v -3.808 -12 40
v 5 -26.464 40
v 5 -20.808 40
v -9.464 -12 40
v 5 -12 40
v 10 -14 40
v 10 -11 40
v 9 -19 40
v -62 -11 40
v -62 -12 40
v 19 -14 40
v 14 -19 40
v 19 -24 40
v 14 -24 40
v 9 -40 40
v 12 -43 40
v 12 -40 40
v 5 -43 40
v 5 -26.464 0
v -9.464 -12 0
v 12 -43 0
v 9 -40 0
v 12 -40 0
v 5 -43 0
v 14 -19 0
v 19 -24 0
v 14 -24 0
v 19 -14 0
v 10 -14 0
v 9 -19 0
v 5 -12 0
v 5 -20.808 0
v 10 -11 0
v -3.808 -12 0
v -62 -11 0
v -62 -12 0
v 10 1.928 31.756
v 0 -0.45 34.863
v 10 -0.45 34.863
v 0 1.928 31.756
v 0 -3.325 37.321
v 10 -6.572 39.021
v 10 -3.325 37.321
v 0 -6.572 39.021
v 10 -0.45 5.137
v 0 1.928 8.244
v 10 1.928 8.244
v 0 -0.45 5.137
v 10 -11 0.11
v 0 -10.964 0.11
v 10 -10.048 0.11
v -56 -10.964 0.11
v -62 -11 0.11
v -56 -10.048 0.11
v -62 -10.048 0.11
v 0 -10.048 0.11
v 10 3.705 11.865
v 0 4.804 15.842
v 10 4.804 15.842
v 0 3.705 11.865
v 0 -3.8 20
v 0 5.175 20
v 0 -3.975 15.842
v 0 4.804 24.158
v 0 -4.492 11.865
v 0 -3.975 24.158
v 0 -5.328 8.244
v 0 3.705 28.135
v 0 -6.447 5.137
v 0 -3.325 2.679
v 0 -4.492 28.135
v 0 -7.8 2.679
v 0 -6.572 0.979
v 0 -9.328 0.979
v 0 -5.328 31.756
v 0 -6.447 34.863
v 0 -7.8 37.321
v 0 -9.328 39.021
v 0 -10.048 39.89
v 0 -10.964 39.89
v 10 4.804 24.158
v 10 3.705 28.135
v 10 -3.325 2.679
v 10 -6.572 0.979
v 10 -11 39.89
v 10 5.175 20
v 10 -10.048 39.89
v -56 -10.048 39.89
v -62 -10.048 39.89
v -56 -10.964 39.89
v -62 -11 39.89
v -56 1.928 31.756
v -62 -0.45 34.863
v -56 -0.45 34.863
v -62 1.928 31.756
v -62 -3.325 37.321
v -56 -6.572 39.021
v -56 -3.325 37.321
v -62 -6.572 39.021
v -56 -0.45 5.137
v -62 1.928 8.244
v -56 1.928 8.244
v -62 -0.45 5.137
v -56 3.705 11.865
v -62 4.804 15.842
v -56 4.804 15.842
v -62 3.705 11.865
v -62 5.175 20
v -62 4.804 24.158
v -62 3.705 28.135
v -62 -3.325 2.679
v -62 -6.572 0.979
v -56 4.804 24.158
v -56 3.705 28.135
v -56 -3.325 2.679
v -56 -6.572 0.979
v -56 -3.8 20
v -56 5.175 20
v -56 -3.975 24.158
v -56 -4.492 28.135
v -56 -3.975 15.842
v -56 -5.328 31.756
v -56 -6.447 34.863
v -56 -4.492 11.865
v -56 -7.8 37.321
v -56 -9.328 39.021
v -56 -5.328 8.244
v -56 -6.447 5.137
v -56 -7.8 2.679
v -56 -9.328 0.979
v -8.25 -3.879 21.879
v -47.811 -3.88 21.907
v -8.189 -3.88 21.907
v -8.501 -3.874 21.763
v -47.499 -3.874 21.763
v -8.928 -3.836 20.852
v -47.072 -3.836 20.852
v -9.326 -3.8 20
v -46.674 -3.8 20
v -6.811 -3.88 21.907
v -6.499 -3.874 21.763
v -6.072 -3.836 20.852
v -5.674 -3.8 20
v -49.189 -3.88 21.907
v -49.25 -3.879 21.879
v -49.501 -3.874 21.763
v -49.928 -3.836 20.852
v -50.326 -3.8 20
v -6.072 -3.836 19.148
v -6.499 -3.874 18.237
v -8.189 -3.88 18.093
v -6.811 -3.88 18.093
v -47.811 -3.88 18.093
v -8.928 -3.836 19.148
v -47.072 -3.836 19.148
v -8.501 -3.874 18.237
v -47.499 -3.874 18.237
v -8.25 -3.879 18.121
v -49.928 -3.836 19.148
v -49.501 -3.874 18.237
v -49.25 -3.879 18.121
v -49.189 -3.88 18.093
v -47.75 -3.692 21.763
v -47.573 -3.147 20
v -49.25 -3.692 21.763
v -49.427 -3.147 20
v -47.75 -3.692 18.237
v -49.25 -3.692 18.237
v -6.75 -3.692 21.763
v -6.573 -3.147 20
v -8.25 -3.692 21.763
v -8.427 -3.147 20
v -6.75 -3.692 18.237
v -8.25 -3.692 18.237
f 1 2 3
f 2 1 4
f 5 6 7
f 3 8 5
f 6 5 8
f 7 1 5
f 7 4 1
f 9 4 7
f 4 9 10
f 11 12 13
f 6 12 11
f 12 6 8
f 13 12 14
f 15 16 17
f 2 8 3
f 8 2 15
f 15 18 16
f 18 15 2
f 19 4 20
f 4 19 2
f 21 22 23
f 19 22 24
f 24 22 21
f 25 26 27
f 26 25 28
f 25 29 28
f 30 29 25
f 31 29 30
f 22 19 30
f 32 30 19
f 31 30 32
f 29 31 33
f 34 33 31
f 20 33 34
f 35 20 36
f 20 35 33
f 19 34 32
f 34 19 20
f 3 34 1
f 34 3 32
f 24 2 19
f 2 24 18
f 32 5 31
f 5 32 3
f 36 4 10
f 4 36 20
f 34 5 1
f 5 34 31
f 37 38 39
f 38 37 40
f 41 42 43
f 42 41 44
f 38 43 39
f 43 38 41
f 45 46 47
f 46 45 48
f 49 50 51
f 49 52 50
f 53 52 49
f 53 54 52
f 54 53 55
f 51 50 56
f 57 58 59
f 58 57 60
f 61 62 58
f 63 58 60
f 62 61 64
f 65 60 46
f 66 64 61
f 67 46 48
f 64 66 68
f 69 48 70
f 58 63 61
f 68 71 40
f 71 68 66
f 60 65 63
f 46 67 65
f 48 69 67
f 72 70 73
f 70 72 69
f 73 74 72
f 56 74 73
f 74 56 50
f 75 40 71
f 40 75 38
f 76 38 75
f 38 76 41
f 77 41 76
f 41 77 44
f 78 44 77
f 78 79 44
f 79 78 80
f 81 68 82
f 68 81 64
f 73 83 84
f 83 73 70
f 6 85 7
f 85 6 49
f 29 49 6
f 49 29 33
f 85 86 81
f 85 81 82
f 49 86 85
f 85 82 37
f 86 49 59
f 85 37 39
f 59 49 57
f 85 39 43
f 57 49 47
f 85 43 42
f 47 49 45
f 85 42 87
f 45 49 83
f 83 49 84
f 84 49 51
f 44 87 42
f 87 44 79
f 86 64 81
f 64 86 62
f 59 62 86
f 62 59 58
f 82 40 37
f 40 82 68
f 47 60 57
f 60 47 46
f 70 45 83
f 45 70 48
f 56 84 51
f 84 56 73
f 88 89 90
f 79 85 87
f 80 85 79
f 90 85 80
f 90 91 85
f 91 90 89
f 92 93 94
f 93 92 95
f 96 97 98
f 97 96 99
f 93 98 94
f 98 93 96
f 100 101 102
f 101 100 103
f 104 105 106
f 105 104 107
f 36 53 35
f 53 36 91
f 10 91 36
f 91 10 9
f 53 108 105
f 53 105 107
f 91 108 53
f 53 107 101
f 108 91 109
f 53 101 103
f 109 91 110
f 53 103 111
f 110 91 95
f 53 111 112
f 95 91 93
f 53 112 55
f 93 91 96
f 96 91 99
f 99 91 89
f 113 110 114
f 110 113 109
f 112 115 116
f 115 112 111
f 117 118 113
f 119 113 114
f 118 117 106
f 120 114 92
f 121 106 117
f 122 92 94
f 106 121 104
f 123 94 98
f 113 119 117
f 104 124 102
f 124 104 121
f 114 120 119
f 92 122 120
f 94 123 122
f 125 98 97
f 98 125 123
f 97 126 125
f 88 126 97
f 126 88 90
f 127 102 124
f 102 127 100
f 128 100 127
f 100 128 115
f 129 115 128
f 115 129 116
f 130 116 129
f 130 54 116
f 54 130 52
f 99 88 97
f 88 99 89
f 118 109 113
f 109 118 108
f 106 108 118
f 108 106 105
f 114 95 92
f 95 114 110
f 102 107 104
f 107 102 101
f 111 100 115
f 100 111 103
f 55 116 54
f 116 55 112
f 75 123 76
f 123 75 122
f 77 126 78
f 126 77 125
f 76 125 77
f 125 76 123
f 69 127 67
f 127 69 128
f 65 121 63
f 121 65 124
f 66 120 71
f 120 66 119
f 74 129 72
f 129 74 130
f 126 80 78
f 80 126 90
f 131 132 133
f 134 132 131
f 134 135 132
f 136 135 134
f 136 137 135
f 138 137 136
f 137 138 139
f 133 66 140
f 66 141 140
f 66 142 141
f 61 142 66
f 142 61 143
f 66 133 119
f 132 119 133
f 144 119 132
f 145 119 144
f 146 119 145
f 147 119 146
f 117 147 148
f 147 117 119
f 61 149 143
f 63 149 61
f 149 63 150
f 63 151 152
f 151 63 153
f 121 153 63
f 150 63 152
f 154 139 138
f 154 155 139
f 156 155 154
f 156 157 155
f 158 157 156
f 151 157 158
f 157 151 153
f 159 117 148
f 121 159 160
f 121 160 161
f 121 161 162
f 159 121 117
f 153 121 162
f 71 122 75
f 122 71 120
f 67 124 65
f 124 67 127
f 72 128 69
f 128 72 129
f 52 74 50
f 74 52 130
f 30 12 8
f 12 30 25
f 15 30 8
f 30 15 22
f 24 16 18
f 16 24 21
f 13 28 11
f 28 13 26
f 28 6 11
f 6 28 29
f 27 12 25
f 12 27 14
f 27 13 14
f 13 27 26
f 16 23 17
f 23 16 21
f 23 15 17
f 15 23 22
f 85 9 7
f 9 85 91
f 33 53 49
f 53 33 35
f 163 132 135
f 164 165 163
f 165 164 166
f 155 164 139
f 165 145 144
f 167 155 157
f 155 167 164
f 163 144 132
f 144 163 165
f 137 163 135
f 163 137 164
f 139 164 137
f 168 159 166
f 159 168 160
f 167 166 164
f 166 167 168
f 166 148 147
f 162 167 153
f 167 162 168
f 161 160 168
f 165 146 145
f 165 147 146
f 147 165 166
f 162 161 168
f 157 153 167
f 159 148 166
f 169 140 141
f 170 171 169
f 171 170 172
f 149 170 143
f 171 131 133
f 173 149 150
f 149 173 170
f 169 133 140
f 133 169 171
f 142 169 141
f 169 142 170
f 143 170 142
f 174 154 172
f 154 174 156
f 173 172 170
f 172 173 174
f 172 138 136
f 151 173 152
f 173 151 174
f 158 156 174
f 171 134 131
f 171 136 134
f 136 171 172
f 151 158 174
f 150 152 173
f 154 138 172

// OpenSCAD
/*
 * Based on the "Fabrikator mini Esun Spool holder" by "Rlw":
 * http://www.thingiverse.com/thing:1324831
 *
 * Recreated and parameterized by:
 * Thomas Buck <xythobuz@xythobuz.de> in March 2016
 *
 * Licensed under the Creative Commons - Attribution license.
 *
 * Settings suggested by the original author:
 *   Rafts: No
 *   Supports: No
 *   Resolution: 0.2mm
 *   Infill: 15%
 */

// Modify the overall length (moving the top part)
size_modifier = -25;

// Spool width
spool_width = 56;

// Distance of spool rollers from border
balls_distance = 7.5;

// width of outer spool border
outer_border_width = 6;

// set if the inner spool border should be rounded
// to save some more material
round_top = true;

// -----------------------------------------------------------

inner_border_width = round_top ? 10 : 5;
body_height_modifier = round_top ? -19 : 0;

// -----------------------------------------------------------

// a cylinder cut in half in the middle
module half_cylinder(h, r) {
    difference() {
        cylinder(h, r, r);
        translate([0, -r, 0]) cube([r, 2 * r, h]);
    }
}

// -----------------------------------------------------------

//import("fabrikator_mini_gsun_5kg_175mm__spool_holder.stl");

// upper body
translate([5, -19, 0])
    cube([5, 51 + size_modifier + body_height_modifier, 40]);

// lower body
translate([5, -43, 0])
    cube([4, 24, 40]);

// upper border
translate([10, -19, 0])
    cube([9, 5, 40]);

// upper lip
translate([14, -24, 0])
    cube([5, 5, 40]);

// lower border
translate([9, -43, 0])
    cube([3, 3, 40]);

// stabilization
translate([0,  size_modifier, 0]) difference() {
    rotate([0, 0, 45]) translate([2.5, -5, 0]) cube([4, 21, 40]);

    translate([5, -5, 0]) cube([10, 10, 40]);
    translate([-10, 13, 0]) cube([10, 10, 40]);
}

// inner border
translate([0,  size_modifier, 0])
    scale([1, 0.85, 1])
    translate([0, 15.5, 20])
    rotate([-90, 0, 0])
    rotate([0, 90, 0])
    half_cylinder(inner_border_width, 20);

// outer border
translate([0,  size_modifier, 0])
    scale([1, 0.85, 1])
    translate([-(spool_width + outer_border_width), 15.5, 20])
    rotate([-90, 0, 0])
    rotate([0, 90, 0])
    half_cylinder(outer_border_width, 20);

// roll plane
translate([0,  size_modifier, 0])
    translate([-(spool_width + outer_border_width), 13, 0])
    cube([spool_width + outer_border_width + inner_border_width, 1, 40]);

// roll
translate([0,  size_modifier, 0])
    scale([1, 0.4, 1])
    translate([-spool_width, 33, 20])
    rotate([-90, 0, 0])
    rotate([0, 90, 0])
    half_cylinder(spool_width, 20);

// rolling balls
translate([0,  size_modifier, 0])
    translate([-(spool_width - balls_distance), 19, 20])
    sphere(r = 3);
translate([0,  size_modifier, 0])
    translate([-balls_distance, 19, 20])
    sphere(r = 3);
